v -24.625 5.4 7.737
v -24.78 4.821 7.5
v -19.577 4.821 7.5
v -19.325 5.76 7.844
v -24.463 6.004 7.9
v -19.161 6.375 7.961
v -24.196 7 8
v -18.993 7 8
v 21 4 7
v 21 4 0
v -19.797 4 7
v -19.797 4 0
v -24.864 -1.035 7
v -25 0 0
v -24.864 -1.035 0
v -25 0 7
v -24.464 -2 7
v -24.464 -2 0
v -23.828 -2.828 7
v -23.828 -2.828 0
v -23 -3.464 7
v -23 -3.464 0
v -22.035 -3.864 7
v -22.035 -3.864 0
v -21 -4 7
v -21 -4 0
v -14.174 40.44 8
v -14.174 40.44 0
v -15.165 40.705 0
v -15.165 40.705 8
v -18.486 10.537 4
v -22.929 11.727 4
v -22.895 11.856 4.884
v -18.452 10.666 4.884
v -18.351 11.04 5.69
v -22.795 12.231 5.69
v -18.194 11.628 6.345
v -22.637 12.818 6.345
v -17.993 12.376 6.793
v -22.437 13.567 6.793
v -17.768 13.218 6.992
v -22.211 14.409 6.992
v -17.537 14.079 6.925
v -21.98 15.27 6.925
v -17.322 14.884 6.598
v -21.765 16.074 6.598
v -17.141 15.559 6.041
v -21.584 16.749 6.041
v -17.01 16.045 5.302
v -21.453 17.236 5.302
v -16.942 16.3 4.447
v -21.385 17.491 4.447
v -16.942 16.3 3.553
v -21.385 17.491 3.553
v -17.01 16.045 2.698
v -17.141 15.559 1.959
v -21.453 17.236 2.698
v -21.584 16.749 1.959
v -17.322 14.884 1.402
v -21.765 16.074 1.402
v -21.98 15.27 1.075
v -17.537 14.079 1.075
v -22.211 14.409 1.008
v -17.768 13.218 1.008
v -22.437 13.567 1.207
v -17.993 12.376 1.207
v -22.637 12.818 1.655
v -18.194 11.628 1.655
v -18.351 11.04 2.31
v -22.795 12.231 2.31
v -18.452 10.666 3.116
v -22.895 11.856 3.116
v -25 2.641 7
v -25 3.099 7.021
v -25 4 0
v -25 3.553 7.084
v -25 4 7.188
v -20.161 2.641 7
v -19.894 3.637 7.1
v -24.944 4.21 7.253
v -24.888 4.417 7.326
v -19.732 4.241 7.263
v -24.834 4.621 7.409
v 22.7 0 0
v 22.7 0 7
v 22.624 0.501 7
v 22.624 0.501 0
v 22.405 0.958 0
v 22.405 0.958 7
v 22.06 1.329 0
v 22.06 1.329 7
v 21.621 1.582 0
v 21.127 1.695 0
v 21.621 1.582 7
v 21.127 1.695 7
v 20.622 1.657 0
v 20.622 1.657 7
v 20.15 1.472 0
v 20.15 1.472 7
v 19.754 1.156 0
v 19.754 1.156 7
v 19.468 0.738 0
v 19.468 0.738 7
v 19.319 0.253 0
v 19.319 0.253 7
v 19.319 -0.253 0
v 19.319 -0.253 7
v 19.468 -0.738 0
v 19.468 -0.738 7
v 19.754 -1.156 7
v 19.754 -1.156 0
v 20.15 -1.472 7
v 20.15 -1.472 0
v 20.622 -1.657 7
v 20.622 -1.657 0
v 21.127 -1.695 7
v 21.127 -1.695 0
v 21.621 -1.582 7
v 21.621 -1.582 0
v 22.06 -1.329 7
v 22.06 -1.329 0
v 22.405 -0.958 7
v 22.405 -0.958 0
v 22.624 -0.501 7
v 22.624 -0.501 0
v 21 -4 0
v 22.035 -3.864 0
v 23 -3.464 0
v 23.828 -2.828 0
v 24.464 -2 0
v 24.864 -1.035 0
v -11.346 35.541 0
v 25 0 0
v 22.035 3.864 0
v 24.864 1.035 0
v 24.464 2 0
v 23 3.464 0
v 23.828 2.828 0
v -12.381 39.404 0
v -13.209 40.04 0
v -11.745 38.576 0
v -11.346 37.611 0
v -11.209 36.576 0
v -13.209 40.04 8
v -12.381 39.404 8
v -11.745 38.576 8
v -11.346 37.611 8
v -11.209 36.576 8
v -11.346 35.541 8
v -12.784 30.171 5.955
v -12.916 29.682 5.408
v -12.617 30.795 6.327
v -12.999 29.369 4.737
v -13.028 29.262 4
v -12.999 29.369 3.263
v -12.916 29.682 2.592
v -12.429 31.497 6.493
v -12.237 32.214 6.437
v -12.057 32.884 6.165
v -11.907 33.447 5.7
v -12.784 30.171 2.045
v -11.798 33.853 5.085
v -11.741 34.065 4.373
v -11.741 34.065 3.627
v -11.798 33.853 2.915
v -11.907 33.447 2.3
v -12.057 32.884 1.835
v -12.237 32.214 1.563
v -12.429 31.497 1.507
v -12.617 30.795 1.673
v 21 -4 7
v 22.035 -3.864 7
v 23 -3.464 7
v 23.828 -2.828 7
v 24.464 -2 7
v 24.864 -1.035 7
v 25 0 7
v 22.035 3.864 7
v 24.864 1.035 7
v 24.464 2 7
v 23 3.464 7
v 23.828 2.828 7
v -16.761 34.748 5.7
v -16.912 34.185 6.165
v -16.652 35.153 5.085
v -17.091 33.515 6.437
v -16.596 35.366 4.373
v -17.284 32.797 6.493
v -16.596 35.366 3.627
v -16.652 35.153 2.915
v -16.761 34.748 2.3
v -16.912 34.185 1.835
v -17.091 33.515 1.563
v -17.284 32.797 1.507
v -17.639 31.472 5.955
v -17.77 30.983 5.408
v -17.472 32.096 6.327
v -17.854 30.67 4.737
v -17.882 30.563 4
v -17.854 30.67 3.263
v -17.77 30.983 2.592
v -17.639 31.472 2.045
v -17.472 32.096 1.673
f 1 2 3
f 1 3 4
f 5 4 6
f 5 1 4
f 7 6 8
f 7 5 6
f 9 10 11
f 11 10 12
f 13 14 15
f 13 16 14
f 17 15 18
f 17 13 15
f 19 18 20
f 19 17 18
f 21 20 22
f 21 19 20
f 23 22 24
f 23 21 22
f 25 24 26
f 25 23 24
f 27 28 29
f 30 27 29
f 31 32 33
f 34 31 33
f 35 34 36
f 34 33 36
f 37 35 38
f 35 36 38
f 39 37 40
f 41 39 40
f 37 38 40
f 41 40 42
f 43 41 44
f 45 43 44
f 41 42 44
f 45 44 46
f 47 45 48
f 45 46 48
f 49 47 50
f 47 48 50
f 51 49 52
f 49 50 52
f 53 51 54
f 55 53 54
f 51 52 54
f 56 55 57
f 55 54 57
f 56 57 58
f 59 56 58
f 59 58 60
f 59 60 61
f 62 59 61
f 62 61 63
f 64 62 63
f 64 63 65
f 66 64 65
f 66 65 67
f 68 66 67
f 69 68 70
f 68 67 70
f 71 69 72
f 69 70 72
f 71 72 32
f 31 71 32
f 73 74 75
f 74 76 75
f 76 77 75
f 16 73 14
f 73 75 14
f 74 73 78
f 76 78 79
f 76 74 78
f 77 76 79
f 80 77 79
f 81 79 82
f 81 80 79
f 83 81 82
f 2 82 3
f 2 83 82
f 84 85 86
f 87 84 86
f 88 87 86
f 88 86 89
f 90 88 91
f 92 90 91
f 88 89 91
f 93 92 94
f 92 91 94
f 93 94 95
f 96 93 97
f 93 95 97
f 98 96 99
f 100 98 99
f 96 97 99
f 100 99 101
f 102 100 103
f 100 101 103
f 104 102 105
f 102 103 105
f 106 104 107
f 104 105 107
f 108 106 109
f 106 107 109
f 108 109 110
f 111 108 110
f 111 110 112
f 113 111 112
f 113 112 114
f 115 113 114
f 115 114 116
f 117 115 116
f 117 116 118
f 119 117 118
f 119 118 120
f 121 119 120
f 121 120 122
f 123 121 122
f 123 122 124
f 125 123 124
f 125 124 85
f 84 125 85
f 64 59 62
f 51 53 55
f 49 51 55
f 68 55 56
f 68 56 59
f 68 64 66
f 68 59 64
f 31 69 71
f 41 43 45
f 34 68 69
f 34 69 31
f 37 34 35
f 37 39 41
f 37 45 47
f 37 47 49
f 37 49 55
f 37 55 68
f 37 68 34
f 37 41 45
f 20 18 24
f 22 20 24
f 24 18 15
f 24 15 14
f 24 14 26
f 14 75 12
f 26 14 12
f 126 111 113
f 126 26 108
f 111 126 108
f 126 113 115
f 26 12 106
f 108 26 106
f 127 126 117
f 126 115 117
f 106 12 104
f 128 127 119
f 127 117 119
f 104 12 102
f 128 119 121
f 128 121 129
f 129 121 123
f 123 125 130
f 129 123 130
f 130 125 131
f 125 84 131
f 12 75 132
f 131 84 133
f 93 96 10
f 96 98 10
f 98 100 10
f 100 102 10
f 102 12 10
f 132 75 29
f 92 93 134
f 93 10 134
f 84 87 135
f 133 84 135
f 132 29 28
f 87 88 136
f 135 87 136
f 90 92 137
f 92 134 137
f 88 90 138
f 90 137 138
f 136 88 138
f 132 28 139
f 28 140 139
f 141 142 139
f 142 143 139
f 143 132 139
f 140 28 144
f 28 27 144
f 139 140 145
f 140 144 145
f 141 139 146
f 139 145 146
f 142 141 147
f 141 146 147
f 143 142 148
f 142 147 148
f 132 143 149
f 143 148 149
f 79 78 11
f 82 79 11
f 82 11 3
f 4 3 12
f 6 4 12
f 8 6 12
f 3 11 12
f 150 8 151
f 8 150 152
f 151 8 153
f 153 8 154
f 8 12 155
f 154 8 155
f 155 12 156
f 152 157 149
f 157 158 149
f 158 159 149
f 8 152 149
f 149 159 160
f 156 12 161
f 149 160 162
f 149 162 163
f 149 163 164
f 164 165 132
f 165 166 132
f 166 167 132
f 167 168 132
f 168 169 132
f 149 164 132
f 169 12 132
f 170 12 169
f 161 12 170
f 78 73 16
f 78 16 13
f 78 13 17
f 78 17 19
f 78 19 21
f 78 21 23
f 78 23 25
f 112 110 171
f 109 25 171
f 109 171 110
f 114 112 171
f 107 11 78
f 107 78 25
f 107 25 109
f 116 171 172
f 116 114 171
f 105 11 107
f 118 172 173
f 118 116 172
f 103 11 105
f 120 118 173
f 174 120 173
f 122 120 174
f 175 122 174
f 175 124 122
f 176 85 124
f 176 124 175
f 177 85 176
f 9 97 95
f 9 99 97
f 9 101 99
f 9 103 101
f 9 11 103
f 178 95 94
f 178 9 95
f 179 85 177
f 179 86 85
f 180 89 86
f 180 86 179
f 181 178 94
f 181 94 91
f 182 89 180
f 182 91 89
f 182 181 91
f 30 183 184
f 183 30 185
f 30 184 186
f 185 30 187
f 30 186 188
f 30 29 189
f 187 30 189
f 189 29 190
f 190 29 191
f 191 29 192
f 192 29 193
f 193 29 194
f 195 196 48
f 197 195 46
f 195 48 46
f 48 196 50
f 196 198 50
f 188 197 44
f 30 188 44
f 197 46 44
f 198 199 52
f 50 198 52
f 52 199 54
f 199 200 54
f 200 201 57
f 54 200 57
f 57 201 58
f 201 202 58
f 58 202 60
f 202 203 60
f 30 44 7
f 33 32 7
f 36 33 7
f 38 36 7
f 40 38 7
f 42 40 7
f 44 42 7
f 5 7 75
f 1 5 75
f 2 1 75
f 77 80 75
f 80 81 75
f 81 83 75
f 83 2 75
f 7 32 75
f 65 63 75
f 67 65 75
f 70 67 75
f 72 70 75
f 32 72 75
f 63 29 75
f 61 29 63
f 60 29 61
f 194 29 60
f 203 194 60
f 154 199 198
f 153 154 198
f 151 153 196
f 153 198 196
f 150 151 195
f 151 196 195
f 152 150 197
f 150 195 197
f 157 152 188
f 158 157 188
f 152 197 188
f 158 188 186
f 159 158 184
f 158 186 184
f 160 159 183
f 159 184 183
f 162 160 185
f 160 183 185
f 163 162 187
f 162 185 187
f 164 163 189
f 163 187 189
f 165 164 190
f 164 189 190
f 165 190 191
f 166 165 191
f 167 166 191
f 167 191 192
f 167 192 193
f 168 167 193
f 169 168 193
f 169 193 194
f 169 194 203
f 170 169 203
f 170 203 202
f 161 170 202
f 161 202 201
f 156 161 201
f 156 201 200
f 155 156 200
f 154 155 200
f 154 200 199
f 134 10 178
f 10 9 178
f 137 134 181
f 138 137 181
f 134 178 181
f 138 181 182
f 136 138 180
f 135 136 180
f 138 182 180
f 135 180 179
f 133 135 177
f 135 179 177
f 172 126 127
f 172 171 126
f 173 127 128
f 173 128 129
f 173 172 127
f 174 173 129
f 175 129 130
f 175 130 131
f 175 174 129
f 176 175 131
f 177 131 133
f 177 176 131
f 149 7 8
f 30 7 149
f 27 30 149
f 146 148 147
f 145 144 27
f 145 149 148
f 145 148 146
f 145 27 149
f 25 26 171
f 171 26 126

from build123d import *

# Parameters (mm, degrees)
F1_DEPTH    = 7
F2_DEPTH    = 8
F3_R        = 3.99999
F4_T1_DEPTH = 20.2030500331
F5_R        = 5
F6_R        = 2.5
F7_DEPTH    = 10
F6_R_2      = 3
F8_DEPTH    = 4.6
F9_R        = 1.7
F10_DEPTH   = 7.001


# Not quite as in the source:
# - a fillet or chamfer that OpenCascade refuses, or shapes differently, is made with other operations: its cross-section is extruded or revolved along the edge and cut away or added
# - a fillet or chamfer is up to 0.001 mm smaller than in the source, because OpenCascade refuses the exact size


with BuildPart() as f1:
    # F0 (on Top) → F1 (new body)
    with BuildSketch(Plane.XY):
        Polygon((-25, -4), (25, -4), (25, 4), (-19.7969499669, 4), (-25, 4), align=None)
    extrude(amount=F1_DEPTH)

    # F0 (on Top) → F2 (join)
    with BuildSketch(Plane.XY):
        Polygon((-15.1648762861, 40.705181399), (-25, 4), (-19.7969499669, 4), (-10.3103645166, 39.4044188907), align=None)
    extrude(amount=F2_DEPTH)

    # F3 (radius 4 in the source; OpenCascade refuses exactly that, so slightly less here)
    f3_edges = [f1.edges().sort_by_distance(p)[0] for p in [
        (25, 4, 3.5),
        (25, -4, 3.5),
        (-25, -4, 3.5),
        (-10.310365, 39.404419, 4),
    ]]
    fillet(f3_edges, radius=F3_R)

    # F4: fillet of radius 5 on 1 edges, made by hand

    # F4_s2 → F4_t1 (cut)
    with BuildSketch(Plane.YZ.offset(-32.5)):
        with BuildLine():
            ThreePointArc((4, 7), (5.4188611699, 7.7434164903), (7, 8))
            Line((7, 8), (4, 8))
            Line((4, 8), (4, 7))
        make_face()
    extrude(amount=F4_T1_DEPTH, mode=Mode.SUBTRACT)

    # F5
    f5_edges = [f1.edges().sort_by_distance(p)[0] for p in [
        (-22.398475, 4, 7),
    ]]
    fillet(f5_edges, radius=F5_R)

    # F6 (on face) → F7 (cut)
    with BuildSketch(Plane(origin=(-24.3253175473, 6.5179491924, 0), x_dir=(-0.2588190451, -0.9659258263, 0), z_dir=(-0.9659258263, 0.2588190451, 0))):
        with Locations((-27.3932271776, 4)):
            Circle(F6_R)
    extrude(amount=-F7_DEPTH, mode=Mode.SUBTRACT)

    # F6 (on face) → F8 (cut)
    with BuildSketch(Plane(origin=(-24.3253175473, 6.5179491924, 0), x_dir=(-0.2588190451, -0.9659258263, 0), z_dir=(-0.9659258263, 0.2588190451, 0))):
        with Locations((-8.3932271776, 4)):
            Circle(F6_R_2)
    extrude(amount=-F8_DEPTH, mode=Mode.SUBTRACT)

    # F9 (on face) → F10 (cut, through all)
    with BuildSketch(Plane.XY.offset(7)):
        with Locations((21, 0)):
            Circle(F9_R)
    extrude(amount=-F10_DEPTH, mode=Mode.SUBTRACT)


solid = f1.part
